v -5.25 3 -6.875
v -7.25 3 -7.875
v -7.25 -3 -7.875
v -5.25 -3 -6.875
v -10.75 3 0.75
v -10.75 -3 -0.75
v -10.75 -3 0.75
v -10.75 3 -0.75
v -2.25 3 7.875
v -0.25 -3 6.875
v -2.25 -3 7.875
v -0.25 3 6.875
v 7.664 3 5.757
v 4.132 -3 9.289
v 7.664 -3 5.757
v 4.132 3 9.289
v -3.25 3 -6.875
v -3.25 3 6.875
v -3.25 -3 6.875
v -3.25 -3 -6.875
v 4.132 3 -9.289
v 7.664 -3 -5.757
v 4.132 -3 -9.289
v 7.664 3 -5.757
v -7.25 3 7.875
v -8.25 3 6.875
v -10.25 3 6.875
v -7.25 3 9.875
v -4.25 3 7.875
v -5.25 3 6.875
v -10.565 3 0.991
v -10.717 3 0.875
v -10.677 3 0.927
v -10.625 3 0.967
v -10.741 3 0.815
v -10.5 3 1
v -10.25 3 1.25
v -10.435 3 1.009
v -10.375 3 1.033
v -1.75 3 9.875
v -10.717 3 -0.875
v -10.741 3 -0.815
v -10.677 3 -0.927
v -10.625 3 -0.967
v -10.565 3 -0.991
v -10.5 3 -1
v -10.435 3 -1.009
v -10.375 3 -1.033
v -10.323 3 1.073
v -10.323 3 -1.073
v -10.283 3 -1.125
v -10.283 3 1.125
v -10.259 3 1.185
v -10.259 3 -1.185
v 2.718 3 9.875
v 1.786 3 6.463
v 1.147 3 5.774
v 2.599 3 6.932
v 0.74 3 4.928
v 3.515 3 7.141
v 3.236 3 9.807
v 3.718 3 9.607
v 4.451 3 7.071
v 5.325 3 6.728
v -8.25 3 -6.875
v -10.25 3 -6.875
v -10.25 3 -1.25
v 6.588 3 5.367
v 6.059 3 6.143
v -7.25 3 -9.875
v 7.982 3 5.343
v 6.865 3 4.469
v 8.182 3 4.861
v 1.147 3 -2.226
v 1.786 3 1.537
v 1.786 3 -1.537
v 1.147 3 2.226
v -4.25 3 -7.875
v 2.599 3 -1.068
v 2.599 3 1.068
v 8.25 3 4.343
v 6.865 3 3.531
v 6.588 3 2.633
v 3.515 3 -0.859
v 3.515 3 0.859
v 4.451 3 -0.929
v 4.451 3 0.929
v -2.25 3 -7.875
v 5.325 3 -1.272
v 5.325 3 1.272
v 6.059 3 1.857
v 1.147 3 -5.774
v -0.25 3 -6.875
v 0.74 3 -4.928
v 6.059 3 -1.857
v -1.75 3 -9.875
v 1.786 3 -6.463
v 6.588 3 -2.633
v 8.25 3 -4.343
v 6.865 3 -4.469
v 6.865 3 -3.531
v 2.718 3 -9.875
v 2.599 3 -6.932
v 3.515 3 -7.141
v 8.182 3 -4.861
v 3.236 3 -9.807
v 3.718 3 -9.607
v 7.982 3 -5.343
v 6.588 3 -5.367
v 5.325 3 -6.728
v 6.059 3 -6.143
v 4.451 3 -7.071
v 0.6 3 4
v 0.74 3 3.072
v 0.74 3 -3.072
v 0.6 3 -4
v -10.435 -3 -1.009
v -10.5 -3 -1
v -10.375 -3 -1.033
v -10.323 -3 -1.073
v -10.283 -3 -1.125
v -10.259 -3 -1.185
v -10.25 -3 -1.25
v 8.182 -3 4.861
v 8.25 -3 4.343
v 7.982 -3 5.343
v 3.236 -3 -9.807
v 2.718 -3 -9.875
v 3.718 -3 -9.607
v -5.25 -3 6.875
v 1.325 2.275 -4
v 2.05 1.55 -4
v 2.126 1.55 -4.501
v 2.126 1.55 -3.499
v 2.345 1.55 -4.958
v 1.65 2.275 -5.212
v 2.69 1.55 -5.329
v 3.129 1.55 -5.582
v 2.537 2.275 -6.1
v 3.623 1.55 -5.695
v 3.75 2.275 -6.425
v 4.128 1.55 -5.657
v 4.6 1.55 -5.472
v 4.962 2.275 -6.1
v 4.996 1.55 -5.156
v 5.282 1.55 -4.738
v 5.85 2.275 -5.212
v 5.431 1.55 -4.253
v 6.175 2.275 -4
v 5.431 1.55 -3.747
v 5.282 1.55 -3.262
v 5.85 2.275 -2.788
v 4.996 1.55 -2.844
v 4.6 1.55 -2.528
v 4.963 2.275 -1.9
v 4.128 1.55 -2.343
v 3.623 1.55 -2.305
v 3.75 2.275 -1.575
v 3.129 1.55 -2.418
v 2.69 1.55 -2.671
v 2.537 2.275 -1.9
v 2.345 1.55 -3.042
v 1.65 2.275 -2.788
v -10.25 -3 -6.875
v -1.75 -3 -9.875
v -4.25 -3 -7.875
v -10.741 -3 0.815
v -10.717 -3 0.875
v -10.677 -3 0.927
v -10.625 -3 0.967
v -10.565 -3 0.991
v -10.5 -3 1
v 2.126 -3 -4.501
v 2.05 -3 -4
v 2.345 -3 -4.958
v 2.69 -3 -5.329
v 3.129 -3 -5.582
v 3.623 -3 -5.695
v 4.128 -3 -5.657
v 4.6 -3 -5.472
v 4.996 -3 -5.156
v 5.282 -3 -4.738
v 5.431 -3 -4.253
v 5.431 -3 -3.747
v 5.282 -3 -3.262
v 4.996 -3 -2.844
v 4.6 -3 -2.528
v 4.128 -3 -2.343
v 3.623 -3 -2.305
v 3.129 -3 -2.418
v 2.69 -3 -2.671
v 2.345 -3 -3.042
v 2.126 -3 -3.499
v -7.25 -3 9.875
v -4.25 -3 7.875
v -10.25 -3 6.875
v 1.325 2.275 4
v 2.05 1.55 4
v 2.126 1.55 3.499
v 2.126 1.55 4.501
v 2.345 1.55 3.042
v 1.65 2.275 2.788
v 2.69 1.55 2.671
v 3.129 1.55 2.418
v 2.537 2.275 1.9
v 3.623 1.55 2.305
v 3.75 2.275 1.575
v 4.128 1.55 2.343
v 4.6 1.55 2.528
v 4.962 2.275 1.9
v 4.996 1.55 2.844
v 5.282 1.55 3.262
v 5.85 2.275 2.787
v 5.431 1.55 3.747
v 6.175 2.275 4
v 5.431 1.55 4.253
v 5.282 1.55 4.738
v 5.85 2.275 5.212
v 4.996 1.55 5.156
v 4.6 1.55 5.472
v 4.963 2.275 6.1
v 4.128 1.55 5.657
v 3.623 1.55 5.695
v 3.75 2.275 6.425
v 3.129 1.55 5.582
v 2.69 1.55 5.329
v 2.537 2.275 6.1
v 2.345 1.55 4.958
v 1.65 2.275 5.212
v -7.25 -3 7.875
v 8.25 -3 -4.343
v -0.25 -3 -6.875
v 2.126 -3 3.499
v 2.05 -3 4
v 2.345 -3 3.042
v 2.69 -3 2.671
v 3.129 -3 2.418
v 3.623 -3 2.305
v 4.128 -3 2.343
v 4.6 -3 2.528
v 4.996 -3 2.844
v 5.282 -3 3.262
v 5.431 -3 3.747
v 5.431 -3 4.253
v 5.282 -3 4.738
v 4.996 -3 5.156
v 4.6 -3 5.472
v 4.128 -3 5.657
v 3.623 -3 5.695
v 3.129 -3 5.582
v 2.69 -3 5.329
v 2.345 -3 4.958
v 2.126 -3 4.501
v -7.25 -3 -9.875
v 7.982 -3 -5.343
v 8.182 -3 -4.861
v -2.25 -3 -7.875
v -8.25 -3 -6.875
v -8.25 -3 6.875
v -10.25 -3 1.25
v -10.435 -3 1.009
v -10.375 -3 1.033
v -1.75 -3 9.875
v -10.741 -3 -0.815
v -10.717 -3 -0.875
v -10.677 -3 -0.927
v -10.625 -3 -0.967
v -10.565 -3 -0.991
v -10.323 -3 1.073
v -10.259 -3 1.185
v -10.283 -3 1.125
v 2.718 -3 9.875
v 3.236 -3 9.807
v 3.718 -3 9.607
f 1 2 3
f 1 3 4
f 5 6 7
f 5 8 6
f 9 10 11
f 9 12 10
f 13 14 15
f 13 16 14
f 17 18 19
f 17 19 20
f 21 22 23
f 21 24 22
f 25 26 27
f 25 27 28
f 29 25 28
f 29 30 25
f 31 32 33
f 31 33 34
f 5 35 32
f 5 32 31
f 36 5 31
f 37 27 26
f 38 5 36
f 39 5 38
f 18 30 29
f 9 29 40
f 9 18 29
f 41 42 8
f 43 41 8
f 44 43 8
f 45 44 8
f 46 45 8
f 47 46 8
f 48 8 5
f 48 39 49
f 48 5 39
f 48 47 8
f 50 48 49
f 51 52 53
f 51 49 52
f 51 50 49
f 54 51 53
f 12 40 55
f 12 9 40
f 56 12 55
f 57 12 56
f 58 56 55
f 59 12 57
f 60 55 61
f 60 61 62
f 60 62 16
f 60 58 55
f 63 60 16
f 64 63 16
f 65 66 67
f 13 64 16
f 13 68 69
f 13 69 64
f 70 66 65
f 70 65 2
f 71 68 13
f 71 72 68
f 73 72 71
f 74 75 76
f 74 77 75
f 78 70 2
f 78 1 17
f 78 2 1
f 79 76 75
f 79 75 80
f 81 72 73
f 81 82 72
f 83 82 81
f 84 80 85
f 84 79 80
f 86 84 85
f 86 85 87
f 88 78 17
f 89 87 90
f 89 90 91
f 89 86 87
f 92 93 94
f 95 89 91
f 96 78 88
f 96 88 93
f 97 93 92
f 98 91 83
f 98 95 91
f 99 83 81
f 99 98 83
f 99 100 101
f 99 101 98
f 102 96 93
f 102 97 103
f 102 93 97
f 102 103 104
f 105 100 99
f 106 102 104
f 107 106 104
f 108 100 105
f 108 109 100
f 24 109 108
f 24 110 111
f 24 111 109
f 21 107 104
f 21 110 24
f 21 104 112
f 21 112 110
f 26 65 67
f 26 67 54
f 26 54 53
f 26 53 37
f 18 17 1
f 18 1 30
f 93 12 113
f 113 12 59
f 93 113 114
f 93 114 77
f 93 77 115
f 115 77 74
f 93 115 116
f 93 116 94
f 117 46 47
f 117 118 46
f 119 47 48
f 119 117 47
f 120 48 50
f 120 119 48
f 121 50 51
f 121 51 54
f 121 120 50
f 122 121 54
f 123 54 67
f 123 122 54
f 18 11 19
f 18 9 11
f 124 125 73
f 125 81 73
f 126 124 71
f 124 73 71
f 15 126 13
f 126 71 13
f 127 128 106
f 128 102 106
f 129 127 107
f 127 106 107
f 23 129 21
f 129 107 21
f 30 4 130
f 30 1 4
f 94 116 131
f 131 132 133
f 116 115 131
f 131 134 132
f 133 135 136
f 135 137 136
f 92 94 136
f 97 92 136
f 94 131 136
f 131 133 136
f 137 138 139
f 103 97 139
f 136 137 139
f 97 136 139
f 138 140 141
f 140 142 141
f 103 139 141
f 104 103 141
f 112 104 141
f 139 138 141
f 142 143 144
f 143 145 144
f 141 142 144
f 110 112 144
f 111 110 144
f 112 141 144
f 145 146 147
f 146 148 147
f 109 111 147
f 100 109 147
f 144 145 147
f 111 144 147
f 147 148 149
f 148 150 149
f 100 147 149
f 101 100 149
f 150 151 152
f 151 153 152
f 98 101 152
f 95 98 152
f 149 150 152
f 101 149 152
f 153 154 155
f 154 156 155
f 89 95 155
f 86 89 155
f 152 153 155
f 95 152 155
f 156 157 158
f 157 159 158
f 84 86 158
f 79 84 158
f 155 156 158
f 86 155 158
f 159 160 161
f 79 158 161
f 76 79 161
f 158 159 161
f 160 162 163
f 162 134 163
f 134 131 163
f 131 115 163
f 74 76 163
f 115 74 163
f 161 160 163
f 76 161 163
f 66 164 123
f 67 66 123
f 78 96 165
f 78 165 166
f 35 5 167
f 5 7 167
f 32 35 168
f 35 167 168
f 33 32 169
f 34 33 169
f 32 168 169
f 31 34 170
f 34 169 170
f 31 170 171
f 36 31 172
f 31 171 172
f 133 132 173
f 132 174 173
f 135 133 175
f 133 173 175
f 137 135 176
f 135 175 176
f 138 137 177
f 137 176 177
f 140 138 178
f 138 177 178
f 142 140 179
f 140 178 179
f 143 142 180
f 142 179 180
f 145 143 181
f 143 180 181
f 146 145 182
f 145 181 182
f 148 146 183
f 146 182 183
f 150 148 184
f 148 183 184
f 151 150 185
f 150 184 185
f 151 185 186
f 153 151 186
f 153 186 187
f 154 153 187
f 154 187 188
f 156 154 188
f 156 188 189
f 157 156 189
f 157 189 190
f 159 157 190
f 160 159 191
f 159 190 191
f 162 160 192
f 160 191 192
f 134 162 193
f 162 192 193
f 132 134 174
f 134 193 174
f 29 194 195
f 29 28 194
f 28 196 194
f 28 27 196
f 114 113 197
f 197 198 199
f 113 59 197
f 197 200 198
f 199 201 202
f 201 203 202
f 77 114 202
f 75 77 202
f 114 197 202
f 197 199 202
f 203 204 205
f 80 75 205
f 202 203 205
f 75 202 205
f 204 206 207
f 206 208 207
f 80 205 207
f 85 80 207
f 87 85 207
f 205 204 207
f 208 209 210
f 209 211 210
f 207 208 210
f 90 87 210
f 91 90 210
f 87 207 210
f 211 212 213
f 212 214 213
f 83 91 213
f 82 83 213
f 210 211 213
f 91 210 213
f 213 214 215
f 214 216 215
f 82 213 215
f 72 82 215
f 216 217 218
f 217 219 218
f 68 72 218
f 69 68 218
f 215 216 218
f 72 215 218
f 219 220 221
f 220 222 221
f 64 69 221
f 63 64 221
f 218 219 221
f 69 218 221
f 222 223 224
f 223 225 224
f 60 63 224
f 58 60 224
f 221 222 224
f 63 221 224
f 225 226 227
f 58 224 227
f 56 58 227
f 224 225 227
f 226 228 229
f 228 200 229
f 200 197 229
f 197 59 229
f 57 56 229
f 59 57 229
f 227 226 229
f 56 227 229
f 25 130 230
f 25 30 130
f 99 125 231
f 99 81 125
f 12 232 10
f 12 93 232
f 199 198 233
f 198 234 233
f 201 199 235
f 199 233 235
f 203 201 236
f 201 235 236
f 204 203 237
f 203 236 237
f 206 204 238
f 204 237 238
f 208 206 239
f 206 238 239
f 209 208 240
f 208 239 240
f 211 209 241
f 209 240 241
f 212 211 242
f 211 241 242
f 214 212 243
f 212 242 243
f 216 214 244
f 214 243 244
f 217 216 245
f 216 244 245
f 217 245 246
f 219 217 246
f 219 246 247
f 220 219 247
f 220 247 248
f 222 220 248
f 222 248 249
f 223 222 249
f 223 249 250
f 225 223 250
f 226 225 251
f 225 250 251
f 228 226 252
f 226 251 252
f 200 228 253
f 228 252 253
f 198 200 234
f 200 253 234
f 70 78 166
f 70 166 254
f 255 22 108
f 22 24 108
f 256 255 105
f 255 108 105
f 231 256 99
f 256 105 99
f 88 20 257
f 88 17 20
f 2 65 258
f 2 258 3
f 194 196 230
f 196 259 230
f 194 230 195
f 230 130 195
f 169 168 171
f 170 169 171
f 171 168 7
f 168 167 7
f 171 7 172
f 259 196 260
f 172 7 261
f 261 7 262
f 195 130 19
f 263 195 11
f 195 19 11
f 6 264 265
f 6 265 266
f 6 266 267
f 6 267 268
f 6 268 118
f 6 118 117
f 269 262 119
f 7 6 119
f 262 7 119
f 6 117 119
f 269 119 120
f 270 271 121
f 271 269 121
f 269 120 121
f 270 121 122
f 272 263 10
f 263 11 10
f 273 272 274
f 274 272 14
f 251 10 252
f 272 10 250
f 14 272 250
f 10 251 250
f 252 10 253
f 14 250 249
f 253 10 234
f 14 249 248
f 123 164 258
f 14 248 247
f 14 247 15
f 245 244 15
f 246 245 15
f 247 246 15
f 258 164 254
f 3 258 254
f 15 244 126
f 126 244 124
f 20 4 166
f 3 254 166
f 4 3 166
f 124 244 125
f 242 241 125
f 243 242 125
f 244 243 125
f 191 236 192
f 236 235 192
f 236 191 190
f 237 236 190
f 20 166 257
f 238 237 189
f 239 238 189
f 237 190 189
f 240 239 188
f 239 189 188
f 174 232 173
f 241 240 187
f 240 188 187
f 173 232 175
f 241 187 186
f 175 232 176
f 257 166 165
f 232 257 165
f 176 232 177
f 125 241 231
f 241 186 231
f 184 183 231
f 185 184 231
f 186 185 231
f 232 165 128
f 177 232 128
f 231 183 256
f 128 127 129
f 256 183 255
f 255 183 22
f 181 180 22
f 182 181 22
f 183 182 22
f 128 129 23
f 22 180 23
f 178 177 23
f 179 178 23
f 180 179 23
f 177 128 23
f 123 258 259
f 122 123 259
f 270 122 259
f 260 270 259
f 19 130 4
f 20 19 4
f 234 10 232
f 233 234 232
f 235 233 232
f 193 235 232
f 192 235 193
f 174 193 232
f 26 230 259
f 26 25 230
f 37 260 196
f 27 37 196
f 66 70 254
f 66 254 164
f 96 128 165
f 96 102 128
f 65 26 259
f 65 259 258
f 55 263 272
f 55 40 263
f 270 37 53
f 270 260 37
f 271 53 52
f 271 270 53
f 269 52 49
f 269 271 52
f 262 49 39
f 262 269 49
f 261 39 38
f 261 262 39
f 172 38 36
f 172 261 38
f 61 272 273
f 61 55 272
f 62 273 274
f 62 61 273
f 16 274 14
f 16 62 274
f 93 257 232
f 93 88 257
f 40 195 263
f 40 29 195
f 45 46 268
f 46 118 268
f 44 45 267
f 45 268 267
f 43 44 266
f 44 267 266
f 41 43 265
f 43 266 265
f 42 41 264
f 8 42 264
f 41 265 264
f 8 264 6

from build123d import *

# Parameters (mm, degrees)
BOSS_EXTRUDE1_DEPTH                                 = 3
FILLET1_R                                           = 2
CSK_FOR_M3_COUNTERSUNK_FLAT_HEAD_SCREW1_D           = 3.4
CSK_FOR_M3_COUNTERSUNK_FLAT_HEAD_SCREW1_CSINK_D     = 6.3
CSK_FOR_M3_COUNTERSUNK_FLAT_HEAD_SCREW1_CSINK_ANGLE = 90
FILLET2_R                                           = 0.25


with BuildPart() as part:
    # Sketch1 → Boss-Extrude1 (new, symmetric)
    with BuildSketch(Plane(origin=(0, 0, 0), x_dir=(1, 0, 0), z_dir=(0, 1, 0))):
        Polygon((-1.75, -9.875), (3.546572875, -9.875), (8.25, -5.171572875), (8.25, 5.171572875), (3.546572875, 9.875), (-1.75, 9.875), (-4.25, 7.875), (-7.25, 9.875), (-10.25, 6.875), (-10.25, 1), (-10.75, 1), (-10.75, -1), (-10.25, -1), (-10.25, -6.875), (-7.25, -9.875), (-4.25, -7.875), align=None)
        Polygon((-8.25, -6.875), (-8.25, 6.875), (-7.25, 7.875), (-5.25, 6.875), (-5.25, -6.875), (-7.25, -7.875), align=None, mode=Mode.SUBTRACT)
        Polygon((-3.25, -6.875), (-3.25, 6.875), (-2.25, 7.875), (-0.25, 6.875), (-0.25, -6.875), (-2.25, -7.875), align=None, mode=Mode.SUBTRACT)
    extrude(amount=BOSS_EXTRUDE1_DEPTH, both=True)

    # Fillet1
    fillet1_edges = [part.edges().sort_by_distance(p)[0] for p in [
        (3.546572875, 0, -9.875),
        (8.25, 0, -5.171572875),
        (8.25, 0, 5.171572875),
        (3.546572875, 0, 9.875),
    ]]
    fillet(fillet1_edges, radius=FILLET1_R)

    # CSK for M3 Countersunk Flat Head Screw1 (through all)
    with Locations(Plane(origin=(0, 3, 0), x_dir=(1, 0, 0), z_dir=(0, 1, 0))):
        with Locations((3.75, 4), (3.75, -4)):
            CounterSinkHole(CSK_FOR_M3_COUNTERSUNK_FLAT_HEAD_SCREW1_D / 2, CSK_FOR_M3_COUNTERSUNK_FLAT_HEAD_SCREW1_CSINK_D / 2, counter_sink_angle=CSK_FOR_M3_COUNTERSUNK_FLAT_HEAD_SCREW1_CSINK_ANGLE)

    # Fillet2
    fillet2_edges = [part.edges().sort_by_distance(p)[0] for p in [
        (-10.25, 0, -1),
        (-10.25, 0, 1),
    ]]
    fillet(fillet2_edges, radius=FILLET2_R)
    fillet2_2_edges = [part.edges().sort_by_distance(p)[0] for p in [
        (-10.75, 0, -1),
        (-10.75, 0, 1),
    ]]
    fillet(fillet2_2_edges, radius=FILLET2_R - 0.0001)  # a hair under: the kernel refuses the full size


solid = part.part
